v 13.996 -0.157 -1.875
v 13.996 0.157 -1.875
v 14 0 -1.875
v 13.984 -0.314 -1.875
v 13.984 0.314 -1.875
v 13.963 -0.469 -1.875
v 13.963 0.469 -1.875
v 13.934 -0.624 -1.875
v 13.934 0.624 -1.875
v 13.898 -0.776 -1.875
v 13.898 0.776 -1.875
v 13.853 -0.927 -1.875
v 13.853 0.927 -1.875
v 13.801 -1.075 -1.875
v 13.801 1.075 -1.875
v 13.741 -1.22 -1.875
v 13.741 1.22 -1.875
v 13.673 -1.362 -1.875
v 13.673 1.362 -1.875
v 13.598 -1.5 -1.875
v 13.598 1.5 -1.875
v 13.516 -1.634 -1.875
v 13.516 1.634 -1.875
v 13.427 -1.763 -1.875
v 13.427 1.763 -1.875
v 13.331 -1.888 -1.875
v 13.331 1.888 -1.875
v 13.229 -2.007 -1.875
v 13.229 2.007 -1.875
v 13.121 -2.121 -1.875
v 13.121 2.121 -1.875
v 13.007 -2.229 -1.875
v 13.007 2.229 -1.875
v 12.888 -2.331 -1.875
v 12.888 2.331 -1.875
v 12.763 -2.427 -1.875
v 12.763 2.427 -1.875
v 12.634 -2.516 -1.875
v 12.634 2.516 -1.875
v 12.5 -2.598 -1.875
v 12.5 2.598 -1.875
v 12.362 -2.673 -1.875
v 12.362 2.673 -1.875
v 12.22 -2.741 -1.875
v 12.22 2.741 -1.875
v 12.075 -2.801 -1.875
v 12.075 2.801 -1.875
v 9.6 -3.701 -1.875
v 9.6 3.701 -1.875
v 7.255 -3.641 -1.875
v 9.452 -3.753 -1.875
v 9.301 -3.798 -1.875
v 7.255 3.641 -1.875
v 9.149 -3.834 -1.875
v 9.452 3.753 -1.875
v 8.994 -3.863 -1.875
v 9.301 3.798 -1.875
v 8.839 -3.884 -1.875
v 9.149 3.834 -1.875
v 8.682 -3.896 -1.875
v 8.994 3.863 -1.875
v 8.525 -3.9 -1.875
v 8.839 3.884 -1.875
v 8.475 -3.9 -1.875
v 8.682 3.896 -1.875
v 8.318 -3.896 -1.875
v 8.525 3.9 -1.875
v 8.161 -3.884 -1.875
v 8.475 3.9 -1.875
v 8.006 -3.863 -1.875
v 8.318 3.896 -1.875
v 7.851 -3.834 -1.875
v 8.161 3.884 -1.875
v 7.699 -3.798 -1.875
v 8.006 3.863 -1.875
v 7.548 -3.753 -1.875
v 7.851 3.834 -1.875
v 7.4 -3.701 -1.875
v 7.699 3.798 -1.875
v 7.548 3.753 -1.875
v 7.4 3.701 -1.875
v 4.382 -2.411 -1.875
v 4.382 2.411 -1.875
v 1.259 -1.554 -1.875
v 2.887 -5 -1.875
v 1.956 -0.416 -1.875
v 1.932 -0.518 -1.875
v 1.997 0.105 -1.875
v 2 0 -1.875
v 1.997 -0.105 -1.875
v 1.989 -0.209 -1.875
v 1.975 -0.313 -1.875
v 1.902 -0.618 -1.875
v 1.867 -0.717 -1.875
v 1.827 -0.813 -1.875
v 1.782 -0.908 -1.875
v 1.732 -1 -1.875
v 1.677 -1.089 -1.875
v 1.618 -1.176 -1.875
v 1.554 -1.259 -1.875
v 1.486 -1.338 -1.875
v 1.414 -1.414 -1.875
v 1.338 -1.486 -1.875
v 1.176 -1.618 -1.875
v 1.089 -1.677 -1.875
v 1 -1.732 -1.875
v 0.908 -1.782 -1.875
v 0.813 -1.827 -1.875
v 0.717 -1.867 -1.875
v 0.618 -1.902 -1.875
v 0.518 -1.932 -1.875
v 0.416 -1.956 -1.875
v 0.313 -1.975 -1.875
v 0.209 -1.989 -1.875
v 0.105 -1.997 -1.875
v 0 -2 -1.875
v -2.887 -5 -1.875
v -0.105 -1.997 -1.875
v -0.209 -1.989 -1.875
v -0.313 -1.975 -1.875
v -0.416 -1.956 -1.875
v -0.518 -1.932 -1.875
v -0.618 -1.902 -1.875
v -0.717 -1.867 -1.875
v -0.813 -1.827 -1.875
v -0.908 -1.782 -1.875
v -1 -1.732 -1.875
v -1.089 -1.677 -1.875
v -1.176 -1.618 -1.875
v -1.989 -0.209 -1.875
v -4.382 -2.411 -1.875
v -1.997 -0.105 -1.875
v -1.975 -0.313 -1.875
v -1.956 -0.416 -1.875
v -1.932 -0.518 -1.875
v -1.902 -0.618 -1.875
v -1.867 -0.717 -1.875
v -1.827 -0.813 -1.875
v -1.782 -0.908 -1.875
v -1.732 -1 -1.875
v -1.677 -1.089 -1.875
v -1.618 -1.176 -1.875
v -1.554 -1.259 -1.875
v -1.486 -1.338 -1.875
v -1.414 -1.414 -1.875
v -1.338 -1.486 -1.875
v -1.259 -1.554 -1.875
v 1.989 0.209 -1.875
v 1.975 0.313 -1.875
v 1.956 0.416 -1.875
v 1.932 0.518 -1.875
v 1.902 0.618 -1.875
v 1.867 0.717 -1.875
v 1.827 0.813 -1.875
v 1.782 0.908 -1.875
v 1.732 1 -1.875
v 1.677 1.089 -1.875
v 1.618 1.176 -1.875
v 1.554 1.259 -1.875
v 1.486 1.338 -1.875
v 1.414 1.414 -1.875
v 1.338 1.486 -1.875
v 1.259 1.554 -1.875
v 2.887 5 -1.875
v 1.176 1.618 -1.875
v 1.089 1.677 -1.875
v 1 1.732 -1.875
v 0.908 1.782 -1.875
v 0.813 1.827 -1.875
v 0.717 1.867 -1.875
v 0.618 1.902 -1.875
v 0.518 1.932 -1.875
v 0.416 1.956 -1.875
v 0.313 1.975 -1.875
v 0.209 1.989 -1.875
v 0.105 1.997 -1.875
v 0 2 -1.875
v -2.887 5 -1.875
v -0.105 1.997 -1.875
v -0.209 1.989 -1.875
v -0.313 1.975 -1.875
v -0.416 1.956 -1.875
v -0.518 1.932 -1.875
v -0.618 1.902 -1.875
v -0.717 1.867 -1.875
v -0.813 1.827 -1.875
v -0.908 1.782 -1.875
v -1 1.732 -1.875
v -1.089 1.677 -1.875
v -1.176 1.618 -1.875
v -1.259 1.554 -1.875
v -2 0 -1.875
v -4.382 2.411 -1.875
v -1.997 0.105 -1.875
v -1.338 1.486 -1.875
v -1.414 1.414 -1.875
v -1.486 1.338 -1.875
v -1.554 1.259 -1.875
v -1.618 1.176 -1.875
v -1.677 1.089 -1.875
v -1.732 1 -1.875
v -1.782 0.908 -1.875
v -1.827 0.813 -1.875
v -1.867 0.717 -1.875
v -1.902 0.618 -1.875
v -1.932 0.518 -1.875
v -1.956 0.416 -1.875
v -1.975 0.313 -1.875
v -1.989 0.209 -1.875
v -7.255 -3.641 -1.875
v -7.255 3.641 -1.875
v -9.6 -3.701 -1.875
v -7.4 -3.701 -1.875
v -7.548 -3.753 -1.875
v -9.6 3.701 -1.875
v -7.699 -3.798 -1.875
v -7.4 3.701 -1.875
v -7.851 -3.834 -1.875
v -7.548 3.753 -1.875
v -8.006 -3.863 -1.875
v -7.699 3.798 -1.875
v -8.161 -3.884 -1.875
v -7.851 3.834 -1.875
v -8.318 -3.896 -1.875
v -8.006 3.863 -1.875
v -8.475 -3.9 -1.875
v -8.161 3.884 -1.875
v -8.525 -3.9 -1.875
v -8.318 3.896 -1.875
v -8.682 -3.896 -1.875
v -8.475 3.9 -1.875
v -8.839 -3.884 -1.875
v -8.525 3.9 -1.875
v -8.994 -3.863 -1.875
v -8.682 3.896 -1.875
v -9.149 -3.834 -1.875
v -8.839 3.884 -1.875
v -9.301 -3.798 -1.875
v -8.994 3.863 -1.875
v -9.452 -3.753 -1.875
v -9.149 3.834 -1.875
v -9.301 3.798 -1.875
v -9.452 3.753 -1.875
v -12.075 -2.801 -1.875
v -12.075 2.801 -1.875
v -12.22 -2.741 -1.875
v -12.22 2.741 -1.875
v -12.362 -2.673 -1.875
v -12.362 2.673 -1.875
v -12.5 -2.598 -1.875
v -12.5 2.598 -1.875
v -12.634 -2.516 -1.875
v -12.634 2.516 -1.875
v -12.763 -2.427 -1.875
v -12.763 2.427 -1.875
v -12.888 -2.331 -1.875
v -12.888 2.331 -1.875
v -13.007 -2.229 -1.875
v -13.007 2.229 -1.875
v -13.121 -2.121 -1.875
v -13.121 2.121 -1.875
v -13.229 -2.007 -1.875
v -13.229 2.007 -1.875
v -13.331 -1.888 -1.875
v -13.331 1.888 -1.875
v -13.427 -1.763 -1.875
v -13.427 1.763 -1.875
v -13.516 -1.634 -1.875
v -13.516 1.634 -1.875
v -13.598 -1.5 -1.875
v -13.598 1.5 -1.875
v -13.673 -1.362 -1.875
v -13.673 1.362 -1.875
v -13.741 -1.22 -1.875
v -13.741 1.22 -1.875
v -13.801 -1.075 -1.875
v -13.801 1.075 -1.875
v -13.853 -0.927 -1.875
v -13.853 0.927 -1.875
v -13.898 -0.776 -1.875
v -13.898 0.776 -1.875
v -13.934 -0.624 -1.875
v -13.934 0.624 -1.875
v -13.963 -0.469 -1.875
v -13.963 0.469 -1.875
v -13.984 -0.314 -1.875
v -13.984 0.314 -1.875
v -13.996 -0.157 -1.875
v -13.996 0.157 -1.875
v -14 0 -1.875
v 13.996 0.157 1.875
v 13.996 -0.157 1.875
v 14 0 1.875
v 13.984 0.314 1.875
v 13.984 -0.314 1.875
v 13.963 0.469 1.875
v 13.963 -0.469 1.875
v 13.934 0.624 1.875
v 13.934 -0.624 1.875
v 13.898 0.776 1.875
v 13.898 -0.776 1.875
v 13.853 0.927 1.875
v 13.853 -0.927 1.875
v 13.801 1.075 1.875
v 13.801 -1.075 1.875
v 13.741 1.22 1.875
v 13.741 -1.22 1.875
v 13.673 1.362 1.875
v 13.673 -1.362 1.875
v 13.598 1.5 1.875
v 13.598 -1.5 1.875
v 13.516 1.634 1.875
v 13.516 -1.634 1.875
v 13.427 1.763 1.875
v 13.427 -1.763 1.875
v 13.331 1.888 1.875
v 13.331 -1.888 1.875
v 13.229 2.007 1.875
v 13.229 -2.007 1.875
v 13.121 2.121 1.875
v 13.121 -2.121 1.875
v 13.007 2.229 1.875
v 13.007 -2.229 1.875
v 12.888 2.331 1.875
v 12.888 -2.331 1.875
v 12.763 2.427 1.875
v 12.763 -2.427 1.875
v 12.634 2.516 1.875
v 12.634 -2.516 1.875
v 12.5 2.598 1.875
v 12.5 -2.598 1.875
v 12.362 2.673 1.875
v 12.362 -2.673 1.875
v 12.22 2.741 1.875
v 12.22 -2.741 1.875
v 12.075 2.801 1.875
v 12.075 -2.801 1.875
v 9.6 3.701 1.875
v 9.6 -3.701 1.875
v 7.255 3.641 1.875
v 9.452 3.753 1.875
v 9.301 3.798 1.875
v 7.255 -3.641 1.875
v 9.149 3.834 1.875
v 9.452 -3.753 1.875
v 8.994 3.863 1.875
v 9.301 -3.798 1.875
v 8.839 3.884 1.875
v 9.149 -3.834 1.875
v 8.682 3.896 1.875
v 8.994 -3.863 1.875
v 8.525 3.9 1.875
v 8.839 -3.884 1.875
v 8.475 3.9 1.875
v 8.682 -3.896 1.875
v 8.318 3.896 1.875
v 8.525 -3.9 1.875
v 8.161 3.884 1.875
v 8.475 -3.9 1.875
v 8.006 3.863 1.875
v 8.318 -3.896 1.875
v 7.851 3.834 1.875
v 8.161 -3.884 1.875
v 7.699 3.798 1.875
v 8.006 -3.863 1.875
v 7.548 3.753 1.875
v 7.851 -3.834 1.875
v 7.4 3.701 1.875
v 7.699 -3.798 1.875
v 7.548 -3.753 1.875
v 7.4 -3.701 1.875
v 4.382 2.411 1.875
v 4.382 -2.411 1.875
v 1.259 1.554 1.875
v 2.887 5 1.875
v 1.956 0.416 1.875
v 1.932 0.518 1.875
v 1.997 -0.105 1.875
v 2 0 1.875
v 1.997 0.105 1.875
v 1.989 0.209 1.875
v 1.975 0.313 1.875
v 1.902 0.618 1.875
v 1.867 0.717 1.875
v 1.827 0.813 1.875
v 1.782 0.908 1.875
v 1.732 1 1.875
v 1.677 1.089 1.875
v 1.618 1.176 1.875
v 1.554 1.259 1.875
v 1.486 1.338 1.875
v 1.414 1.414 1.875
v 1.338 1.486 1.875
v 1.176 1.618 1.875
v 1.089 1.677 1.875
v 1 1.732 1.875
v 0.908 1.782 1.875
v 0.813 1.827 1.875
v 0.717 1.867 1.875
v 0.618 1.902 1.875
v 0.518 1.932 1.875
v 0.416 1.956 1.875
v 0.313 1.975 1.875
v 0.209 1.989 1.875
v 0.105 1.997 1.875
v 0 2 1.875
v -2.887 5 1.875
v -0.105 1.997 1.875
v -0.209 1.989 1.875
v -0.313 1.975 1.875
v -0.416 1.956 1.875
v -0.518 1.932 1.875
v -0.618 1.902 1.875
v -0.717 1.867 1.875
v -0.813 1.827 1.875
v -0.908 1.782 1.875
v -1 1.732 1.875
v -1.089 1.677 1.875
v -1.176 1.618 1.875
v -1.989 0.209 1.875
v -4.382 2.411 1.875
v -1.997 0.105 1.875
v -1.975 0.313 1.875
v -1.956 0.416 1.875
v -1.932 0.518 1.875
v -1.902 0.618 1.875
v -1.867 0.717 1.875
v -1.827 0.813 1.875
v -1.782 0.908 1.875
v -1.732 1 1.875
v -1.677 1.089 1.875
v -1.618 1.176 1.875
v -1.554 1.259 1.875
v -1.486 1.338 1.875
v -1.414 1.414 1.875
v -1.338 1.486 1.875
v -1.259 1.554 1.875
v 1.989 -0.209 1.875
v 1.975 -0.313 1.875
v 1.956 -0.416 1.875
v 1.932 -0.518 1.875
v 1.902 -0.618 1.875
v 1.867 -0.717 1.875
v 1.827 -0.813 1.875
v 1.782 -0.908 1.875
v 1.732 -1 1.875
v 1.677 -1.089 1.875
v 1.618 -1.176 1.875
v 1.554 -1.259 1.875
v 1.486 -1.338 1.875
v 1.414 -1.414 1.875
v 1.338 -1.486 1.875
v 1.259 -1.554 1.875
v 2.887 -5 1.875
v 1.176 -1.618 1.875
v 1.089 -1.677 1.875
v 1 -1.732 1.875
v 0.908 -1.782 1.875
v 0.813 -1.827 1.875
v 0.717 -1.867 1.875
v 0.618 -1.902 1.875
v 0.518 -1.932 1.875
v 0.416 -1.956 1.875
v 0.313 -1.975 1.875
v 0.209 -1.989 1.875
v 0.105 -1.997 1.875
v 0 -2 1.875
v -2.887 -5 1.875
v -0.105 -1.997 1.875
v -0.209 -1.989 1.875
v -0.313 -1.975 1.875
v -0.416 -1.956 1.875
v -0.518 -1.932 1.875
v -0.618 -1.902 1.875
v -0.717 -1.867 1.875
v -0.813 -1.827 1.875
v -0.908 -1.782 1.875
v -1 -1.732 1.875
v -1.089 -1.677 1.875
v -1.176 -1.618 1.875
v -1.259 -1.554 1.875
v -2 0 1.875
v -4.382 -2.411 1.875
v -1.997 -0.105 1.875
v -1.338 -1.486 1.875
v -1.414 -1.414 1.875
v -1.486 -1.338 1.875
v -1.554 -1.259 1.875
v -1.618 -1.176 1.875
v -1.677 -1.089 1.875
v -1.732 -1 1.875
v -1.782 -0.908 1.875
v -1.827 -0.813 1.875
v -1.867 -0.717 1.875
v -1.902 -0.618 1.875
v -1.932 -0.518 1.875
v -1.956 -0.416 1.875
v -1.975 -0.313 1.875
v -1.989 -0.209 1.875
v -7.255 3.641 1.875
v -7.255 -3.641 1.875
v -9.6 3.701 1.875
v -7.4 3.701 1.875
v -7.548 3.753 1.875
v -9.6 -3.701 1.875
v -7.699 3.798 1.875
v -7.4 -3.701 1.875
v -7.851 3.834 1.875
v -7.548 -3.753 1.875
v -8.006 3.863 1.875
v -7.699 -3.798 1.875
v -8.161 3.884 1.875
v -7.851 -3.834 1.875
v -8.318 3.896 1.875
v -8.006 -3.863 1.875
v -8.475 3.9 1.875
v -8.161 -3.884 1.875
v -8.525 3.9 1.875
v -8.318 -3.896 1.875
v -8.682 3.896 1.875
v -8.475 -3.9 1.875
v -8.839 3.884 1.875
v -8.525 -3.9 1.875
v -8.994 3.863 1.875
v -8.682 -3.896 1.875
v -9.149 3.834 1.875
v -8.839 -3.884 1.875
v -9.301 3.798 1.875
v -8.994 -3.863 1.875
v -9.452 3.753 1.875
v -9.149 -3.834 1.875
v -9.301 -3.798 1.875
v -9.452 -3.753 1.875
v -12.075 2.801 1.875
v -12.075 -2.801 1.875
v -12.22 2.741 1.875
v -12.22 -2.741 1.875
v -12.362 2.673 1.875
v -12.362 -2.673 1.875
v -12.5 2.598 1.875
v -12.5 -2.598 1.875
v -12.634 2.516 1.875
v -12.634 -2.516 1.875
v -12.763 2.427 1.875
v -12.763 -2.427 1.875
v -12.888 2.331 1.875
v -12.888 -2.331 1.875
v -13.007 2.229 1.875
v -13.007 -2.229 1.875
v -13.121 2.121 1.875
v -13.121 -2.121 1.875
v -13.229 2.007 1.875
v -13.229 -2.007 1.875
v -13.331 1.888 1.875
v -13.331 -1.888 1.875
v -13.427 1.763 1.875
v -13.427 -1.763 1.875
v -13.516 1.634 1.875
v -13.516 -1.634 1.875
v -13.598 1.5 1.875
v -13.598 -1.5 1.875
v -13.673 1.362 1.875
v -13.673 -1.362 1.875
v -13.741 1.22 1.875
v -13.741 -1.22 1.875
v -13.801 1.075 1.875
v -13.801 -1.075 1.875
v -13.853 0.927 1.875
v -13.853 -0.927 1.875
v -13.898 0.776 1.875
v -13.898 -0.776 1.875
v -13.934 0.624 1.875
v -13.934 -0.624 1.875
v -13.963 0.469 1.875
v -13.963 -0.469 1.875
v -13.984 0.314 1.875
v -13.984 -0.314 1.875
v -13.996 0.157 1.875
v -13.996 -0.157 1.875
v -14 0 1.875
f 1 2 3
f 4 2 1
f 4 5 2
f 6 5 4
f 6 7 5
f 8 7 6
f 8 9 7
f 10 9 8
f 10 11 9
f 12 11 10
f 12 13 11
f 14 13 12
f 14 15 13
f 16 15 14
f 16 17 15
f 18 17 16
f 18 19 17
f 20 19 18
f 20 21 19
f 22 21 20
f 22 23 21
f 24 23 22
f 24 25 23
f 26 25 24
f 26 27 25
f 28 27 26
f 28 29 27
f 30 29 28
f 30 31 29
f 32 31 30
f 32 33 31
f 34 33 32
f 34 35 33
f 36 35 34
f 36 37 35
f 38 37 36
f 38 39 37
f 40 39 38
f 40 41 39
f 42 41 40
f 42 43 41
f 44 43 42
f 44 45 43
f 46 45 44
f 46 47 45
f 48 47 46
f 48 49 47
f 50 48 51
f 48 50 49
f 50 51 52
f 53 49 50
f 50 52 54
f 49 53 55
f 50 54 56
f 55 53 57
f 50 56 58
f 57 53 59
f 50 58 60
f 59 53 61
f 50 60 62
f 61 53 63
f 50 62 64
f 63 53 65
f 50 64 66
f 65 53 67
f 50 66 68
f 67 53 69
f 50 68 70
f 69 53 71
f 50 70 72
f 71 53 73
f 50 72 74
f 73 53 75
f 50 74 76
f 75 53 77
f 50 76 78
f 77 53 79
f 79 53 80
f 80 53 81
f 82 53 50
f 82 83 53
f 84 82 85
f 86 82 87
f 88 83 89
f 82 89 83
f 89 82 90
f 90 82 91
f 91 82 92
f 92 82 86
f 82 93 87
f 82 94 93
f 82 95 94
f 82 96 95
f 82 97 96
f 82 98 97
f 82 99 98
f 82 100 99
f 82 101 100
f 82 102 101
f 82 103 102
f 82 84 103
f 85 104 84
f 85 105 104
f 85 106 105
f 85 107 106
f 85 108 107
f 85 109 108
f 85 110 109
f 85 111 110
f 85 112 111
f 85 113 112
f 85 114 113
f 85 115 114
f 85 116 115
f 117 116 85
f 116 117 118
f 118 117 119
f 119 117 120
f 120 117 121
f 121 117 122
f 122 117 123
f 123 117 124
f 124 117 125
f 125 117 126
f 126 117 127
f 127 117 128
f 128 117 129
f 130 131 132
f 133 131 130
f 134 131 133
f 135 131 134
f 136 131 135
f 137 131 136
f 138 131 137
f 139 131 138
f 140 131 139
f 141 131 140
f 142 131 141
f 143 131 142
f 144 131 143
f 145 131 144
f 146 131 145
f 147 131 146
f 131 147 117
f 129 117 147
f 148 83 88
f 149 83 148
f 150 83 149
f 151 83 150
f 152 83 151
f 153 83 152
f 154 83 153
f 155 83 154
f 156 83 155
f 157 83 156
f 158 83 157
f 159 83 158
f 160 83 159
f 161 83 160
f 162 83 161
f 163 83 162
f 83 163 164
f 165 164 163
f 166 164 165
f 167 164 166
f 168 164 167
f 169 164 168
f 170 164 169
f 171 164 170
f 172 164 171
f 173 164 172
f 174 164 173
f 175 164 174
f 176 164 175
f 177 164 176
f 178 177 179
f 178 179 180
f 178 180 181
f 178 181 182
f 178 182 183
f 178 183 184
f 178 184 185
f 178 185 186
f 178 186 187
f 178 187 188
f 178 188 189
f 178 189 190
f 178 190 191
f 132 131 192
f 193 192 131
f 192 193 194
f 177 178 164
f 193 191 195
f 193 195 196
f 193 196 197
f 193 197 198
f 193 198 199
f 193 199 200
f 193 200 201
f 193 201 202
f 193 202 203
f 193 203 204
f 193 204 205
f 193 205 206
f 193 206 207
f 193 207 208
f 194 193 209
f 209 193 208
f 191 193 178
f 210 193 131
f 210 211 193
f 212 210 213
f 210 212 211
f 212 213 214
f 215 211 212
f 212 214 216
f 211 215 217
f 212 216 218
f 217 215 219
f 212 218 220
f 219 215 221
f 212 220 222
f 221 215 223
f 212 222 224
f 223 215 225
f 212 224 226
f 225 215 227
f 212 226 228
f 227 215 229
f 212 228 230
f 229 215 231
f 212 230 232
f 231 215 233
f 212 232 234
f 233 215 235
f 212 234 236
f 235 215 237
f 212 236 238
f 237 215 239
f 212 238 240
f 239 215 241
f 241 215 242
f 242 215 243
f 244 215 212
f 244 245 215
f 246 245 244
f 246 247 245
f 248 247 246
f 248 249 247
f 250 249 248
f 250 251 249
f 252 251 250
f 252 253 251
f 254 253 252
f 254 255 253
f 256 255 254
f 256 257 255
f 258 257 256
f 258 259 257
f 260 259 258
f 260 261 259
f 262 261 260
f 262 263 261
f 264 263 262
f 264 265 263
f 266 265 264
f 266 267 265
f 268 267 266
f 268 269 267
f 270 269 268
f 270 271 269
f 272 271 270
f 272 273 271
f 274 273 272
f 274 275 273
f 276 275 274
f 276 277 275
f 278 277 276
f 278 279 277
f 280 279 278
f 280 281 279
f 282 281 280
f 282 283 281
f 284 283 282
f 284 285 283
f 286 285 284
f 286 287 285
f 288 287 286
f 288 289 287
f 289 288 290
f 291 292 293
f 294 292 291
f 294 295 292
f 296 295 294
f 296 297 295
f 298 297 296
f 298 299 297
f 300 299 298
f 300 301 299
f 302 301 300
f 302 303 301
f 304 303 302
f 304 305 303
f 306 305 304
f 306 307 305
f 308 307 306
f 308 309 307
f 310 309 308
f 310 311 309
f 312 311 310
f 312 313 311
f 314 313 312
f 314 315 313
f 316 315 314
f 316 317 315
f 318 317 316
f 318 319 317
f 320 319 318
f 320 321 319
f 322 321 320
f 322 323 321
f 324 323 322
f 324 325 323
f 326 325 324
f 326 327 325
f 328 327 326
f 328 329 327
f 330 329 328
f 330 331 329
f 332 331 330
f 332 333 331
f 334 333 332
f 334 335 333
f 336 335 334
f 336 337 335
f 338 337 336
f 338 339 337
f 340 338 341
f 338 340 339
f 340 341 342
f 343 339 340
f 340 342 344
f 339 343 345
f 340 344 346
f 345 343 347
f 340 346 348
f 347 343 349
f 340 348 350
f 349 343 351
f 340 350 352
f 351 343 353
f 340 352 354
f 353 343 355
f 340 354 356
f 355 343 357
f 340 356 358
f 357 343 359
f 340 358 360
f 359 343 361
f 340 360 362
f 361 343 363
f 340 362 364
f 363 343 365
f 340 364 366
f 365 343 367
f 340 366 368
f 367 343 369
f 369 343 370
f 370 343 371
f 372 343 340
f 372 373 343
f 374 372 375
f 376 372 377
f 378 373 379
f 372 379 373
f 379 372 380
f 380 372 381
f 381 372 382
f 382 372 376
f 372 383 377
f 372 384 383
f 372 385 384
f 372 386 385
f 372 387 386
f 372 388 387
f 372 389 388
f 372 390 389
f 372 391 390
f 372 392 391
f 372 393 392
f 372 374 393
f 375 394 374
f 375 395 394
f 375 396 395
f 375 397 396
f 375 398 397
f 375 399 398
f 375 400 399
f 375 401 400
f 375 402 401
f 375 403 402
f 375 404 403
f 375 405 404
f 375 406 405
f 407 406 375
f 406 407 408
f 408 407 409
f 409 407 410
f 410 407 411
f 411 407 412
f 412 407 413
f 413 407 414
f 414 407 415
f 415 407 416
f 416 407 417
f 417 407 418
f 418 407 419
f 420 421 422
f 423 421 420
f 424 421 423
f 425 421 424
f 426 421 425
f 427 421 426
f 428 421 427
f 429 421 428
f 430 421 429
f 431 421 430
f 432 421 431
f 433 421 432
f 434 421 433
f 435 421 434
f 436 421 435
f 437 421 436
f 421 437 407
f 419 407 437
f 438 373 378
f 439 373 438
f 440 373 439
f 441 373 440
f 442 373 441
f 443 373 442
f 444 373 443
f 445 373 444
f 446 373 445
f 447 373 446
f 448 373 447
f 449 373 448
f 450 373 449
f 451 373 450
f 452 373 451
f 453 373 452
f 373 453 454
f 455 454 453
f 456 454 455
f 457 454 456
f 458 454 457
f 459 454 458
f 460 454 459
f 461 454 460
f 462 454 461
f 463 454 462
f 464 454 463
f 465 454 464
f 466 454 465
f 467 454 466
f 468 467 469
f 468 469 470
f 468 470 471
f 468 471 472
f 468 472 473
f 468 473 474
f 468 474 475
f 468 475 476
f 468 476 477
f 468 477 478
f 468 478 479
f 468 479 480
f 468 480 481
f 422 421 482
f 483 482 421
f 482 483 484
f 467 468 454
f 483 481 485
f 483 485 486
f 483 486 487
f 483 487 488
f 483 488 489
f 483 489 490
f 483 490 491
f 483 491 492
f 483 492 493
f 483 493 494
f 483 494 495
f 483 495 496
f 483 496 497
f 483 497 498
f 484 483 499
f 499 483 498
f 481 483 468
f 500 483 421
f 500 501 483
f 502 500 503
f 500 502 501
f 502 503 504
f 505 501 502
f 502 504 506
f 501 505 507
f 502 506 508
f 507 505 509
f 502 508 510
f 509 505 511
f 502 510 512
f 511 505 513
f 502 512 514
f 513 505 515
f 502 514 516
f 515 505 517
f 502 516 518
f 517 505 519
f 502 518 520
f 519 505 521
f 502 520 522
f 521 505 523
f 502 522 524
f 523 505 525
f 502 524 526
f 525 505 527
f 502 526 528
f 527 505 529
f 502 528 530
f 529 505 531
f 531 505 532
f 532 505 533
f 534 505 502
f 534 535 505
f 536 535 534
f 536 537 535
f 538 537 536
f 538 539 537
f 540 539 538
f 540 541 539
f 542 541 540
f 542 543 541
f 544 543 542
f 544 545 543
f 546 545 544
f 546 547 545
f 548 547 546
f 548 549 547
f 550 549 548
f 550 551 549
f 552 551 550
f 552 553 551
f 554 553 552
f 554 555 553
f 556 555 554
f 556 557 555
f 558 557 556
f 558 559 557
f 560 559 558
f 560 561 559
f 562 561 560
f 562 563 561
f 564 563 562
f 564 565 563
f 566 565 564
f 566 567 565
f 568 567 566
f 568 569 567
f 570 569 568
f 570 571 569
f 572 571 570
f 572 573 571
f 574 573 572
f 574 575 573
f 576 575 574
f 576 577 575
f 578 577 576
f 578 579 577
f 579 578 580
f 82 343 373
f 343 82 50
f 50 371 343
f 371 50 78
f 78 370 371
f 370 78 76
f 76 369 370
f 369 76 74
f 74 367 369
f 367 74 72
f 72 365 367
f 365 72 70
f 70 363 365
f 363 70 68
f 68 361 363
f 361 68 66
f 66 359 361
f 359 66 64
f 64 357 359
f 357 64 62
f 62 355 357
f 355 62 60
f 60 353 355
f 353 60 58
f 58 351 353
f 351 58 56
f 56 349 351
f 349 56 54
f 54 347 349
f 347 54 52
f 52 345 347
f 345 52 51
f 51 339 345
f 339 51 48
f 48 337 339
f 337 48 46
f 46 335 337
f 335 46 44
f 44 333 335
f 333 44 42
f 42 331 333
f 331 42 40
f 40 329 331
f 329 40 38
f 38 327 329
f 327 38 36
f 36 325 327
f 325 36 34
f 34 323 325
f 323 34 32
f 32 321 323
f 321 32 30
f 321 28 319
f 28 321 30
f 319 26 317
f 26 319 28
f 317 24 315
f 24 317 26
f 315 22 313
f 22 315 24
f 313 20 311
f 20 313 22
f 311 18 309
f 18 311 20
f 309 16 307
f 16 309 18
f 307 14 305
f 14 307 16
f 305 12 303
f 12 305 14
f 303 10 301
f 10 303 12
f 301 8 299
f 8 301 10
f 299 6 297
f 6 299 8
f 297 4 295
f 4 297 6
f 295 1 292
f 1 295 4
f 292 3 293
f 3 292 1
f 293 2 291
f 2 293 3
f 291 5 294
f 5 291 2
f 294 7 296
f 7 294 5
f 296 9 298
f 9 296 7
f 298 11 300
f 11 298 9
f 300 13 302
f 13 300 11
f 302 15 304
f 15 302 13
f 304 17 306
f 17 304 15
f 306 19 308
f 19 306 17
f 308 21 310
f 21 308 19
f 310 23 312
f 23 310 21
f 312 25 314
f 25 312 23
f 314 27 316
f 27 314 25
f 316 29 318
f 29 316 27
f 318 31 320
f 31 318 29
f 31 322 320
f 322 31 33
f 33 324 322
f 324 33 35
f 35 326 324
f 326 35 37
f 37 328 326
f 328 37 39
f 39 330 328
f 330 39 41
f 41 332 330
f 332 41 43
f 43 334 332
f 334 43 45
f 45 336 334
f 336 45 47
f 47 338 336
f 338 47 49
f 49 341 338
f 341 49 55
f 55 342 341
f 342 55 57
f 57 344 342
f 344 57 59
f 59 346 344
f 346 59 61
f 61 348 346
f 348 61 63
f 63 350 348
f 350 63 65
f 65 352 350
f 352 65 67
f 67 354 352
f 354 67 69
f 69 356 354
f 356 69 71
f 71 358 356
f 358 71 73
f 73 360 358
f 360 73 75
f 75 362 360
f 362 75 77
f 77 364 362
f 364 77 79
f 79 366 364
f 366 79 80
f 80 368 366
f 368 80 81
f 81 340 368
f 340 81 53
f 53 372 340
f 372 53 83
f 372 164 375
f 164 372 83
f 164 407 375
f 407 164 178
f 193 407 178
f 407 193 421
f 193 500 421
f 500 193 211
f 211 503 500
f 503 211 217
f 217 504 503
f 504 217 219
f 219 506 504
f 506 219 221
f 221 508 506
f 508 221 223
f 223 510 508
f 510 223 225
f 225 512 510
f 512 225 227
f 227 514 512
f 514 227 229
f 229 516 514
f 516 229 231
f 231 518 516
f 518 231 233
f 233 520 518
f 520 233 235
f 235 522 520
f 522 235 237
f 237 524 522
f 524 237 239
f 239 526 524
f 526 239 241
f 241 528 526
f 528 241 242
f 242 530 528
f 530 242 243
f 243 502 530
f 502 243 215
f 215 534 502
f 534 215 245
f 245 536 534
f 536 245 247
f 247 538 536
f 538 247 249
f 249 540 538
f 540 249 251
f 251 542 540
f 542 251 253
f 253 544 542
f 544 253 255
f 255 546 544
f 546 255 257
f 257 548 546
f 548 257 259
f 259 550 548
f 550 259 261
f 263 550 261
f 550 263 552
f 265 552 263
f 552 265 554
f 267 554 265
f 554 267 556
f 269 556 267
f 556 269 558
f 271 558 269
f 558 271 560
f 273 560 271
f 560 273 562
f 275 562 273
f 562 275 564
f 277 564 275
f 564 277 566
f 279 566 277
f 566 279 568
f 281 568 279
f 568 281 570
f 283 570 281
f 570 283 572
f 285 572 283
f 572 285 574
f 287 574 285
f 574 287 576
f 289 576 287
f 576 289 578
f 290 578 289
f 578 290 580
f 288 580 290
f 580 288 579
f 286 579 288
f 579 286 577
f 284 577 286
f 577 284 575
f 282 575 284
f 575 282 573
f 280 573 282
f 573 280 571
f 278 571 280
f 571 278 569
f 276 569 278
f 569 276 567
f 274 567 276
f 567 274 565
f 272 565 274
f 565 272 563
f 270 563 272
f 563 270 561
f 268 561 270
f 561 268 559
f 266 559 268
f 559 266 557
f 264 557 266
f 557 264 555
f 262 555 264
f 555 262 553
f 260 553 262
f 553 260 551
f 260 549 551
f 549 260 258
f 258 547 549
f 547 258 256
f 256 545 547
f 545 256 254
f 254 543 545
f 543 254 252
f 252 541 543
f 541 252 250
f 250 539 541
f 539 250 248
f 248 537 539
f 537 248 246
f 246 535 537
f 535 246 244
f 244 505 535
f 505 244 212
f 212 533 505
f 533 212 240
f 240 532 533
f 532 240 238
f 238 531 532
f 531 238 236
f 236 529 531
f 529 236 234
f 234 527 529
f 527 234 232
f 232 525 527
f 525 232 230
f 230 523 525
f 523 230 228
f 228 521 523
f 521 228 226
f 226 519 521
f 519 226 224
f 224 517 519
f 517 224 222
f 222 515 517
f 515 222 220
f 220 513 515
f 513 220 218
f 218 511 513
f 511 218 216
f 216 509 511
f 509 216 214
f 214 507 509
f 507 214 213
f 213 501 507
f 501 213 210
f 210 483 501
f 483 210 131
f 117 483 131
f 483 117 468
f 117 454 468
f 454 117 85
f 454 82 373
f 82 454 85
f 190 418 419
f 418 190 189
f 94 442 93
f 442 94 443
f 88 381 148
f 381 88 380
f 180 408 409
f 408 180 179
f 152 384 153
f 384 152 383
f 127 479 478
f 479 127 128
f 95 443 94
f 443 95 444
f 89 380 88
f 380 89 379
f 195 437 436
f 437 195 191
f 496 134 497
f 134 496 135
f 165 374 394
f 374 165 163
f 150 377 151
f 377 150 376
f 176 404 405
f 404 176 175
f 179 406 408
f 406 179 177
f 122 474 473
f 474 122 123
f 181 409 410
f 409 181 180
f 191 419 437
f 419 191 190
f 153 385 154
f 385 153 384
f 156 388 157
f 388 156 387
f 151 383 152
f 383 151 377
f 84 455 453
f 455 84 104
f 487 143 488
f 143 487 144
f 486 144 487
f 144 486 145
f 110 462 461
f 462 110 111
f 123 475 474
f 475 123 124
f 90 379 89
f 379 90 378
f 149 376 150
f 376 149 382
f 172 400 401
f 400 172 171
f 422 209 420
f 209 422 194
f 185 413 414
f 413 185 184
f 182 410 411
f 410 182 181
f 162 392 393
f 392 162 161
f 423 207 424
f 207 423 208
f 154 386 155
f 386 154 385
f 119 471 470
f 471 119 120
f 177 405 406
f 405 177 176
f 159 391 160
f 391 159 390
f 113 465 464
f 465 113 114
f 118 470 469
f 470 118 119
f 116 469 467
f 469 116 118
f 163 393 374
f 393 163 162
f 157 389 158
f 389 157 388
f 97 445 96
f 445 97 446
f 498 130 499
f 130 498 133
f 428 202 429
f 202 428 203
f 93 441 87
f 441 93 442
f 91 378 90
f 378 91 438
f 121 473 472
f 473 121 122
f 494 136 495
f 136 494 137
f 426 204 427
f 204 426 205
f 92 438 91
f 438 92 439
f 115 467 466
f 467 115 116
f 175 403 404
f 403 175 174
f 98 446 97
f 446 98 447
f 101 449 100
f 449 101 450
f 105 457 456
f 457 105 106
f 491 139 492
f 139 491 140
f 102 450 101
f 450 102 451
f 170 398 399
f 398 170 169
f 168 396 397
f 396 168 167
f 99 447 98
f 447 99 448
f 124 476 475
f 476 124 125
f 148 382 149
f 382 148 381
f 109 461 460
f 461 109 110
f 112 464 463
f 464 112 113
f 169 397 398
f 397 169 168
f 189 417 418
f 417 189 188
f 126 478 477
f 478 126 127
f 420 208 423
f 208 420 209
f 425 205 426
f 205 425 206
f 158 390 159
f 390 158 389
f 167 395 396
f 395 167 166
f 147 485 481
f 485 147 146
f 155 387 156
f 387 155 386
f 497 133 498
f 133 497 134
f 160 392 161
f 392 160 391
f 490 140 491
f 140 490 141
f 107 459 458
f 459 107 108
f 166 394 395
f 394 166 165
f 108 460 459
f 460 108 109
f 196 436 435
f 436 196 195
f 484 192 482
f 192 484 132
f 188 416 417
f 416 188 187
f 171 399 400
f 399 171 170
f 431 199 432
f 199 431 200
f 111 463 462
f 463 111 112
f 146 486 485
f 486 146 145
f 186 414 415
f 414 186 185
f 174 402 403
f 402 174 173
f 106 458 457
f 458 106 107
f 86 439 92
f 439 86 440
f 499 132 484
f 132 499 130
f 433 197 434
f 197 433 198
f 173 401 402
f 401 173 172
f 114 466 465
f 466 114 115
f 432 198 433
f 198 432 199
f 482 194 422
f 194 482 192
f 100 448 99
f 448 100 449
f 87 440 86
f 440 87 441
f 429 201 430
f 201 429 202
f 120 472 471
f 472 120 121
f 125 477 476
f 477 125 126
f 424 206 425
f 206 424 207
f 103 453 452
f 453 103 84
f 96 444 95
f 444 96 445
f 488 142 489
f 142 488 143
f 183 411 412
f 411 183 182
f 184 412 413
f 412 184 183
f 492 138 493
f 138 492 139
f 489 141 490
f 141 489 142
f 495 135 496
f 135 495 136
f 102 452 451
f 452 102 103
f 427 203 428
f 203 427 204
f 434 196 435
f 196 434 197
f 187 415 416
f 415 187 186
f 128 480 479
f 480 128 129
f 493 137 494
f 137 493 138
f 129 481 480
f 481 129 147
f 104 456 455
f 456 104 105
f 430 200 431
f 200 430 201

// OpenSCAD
$fn = 120;

// Target specs
hex_flat_distance = 10.0;   // across flats
nut_thickness     = 3.75;   // overall thickness (Z)
thread_diameter   = 4.0;    // through hole for M4 (simple clearance/hole)

// Wing geometry (shaped lobes, not bars)
wing_span_from_flat = 9.0;  // how far each wing extends outward from hex flat
wing_width          = 8.0;  // wing width (Y) at the lobe
wing_root_width     = 5.0;  // wing width near the nut
wing_tip_round_r    = 3.0;  // rounding at wing tip
root_fillet_r       = 2.0;  // blend into nut

// Derived
hex_circ_d = hex_flat_distance / cos(30); // circumscribed diameter for 6-sided cylinder
eps = 0.02;

// 2D helper: rounded rectangle centered at origin
module rounded_rect_2d(w, h, r) {
    r2 = min(r, min(w, h)/2);
    hull() {
        translate([ w/2 - r2,  h/2 - r2]) circle(r=r2);
        translate([-w/2 + r2,  h/2 - r2]) circle(r=r2);
        translate([ w/2 - r2, -h/2 + r2]) circle(r=r2);
        translate([-w/2 + r2, -h/2 + r2]) circle(r=r2);
    }
}

// 2D wing lobe profile (one side, pointing +X), then extruded to nut_thickness
module wing_lobe_2d() {
    // Place the wing so it starts slightly inside the hex to guarantee connection
    // Hex flat is at x = hex_flat_distance/2; overlap into nut by root_fillet_r
    x0 = hex_flat_distance/2 - root_fillet_r;                 // wing root start (inside nut)
    x1 = hex_flat_distance/2 + wing_span_from_flat;           // wing tip end

    hull() {
        // Root pad (narrower)
        translate([x0 + root_fillet_r, 0])
            rounded_rect_2d(root_fillet_r*2, wing_root_width, root_fillet_r);

        // Mid pad (transition)
        translate([ (x0 + x1)/2, 0])
            rounded_rect_2d((x1 - x0)*0.55, (wing_root_width + wing_width)*0.6, wing_tip_round_r);

        // Tip pad (rounded)
        translate([x1 - wing_tip_round_r, 0])
            circle(r=wing_tip_round_r);
    }
}

// Main solid (hex + two wing lobes), then subtract hole
module wing_nut() {
    difference() {
        // ONE connected solid
        linear_extrude(height=nut_thickness, center=true, convexity=10)
        union() {
            // True hex body (across flats = hex_flat_distance)
            circle(d=hex_circ_d, $fn=6);

            // Two opposed wing lobes (shaped)
            wing_lobe_2d();
            mirror([1,0,0]) wing_lobe_2d();
        }

        // Through hole for 4.0mm screw (simple cylindrical hole)
        cylinder(d=thread_diameter, h=nut_thickness + 2, center=true);
    }
}

wing_nut();
